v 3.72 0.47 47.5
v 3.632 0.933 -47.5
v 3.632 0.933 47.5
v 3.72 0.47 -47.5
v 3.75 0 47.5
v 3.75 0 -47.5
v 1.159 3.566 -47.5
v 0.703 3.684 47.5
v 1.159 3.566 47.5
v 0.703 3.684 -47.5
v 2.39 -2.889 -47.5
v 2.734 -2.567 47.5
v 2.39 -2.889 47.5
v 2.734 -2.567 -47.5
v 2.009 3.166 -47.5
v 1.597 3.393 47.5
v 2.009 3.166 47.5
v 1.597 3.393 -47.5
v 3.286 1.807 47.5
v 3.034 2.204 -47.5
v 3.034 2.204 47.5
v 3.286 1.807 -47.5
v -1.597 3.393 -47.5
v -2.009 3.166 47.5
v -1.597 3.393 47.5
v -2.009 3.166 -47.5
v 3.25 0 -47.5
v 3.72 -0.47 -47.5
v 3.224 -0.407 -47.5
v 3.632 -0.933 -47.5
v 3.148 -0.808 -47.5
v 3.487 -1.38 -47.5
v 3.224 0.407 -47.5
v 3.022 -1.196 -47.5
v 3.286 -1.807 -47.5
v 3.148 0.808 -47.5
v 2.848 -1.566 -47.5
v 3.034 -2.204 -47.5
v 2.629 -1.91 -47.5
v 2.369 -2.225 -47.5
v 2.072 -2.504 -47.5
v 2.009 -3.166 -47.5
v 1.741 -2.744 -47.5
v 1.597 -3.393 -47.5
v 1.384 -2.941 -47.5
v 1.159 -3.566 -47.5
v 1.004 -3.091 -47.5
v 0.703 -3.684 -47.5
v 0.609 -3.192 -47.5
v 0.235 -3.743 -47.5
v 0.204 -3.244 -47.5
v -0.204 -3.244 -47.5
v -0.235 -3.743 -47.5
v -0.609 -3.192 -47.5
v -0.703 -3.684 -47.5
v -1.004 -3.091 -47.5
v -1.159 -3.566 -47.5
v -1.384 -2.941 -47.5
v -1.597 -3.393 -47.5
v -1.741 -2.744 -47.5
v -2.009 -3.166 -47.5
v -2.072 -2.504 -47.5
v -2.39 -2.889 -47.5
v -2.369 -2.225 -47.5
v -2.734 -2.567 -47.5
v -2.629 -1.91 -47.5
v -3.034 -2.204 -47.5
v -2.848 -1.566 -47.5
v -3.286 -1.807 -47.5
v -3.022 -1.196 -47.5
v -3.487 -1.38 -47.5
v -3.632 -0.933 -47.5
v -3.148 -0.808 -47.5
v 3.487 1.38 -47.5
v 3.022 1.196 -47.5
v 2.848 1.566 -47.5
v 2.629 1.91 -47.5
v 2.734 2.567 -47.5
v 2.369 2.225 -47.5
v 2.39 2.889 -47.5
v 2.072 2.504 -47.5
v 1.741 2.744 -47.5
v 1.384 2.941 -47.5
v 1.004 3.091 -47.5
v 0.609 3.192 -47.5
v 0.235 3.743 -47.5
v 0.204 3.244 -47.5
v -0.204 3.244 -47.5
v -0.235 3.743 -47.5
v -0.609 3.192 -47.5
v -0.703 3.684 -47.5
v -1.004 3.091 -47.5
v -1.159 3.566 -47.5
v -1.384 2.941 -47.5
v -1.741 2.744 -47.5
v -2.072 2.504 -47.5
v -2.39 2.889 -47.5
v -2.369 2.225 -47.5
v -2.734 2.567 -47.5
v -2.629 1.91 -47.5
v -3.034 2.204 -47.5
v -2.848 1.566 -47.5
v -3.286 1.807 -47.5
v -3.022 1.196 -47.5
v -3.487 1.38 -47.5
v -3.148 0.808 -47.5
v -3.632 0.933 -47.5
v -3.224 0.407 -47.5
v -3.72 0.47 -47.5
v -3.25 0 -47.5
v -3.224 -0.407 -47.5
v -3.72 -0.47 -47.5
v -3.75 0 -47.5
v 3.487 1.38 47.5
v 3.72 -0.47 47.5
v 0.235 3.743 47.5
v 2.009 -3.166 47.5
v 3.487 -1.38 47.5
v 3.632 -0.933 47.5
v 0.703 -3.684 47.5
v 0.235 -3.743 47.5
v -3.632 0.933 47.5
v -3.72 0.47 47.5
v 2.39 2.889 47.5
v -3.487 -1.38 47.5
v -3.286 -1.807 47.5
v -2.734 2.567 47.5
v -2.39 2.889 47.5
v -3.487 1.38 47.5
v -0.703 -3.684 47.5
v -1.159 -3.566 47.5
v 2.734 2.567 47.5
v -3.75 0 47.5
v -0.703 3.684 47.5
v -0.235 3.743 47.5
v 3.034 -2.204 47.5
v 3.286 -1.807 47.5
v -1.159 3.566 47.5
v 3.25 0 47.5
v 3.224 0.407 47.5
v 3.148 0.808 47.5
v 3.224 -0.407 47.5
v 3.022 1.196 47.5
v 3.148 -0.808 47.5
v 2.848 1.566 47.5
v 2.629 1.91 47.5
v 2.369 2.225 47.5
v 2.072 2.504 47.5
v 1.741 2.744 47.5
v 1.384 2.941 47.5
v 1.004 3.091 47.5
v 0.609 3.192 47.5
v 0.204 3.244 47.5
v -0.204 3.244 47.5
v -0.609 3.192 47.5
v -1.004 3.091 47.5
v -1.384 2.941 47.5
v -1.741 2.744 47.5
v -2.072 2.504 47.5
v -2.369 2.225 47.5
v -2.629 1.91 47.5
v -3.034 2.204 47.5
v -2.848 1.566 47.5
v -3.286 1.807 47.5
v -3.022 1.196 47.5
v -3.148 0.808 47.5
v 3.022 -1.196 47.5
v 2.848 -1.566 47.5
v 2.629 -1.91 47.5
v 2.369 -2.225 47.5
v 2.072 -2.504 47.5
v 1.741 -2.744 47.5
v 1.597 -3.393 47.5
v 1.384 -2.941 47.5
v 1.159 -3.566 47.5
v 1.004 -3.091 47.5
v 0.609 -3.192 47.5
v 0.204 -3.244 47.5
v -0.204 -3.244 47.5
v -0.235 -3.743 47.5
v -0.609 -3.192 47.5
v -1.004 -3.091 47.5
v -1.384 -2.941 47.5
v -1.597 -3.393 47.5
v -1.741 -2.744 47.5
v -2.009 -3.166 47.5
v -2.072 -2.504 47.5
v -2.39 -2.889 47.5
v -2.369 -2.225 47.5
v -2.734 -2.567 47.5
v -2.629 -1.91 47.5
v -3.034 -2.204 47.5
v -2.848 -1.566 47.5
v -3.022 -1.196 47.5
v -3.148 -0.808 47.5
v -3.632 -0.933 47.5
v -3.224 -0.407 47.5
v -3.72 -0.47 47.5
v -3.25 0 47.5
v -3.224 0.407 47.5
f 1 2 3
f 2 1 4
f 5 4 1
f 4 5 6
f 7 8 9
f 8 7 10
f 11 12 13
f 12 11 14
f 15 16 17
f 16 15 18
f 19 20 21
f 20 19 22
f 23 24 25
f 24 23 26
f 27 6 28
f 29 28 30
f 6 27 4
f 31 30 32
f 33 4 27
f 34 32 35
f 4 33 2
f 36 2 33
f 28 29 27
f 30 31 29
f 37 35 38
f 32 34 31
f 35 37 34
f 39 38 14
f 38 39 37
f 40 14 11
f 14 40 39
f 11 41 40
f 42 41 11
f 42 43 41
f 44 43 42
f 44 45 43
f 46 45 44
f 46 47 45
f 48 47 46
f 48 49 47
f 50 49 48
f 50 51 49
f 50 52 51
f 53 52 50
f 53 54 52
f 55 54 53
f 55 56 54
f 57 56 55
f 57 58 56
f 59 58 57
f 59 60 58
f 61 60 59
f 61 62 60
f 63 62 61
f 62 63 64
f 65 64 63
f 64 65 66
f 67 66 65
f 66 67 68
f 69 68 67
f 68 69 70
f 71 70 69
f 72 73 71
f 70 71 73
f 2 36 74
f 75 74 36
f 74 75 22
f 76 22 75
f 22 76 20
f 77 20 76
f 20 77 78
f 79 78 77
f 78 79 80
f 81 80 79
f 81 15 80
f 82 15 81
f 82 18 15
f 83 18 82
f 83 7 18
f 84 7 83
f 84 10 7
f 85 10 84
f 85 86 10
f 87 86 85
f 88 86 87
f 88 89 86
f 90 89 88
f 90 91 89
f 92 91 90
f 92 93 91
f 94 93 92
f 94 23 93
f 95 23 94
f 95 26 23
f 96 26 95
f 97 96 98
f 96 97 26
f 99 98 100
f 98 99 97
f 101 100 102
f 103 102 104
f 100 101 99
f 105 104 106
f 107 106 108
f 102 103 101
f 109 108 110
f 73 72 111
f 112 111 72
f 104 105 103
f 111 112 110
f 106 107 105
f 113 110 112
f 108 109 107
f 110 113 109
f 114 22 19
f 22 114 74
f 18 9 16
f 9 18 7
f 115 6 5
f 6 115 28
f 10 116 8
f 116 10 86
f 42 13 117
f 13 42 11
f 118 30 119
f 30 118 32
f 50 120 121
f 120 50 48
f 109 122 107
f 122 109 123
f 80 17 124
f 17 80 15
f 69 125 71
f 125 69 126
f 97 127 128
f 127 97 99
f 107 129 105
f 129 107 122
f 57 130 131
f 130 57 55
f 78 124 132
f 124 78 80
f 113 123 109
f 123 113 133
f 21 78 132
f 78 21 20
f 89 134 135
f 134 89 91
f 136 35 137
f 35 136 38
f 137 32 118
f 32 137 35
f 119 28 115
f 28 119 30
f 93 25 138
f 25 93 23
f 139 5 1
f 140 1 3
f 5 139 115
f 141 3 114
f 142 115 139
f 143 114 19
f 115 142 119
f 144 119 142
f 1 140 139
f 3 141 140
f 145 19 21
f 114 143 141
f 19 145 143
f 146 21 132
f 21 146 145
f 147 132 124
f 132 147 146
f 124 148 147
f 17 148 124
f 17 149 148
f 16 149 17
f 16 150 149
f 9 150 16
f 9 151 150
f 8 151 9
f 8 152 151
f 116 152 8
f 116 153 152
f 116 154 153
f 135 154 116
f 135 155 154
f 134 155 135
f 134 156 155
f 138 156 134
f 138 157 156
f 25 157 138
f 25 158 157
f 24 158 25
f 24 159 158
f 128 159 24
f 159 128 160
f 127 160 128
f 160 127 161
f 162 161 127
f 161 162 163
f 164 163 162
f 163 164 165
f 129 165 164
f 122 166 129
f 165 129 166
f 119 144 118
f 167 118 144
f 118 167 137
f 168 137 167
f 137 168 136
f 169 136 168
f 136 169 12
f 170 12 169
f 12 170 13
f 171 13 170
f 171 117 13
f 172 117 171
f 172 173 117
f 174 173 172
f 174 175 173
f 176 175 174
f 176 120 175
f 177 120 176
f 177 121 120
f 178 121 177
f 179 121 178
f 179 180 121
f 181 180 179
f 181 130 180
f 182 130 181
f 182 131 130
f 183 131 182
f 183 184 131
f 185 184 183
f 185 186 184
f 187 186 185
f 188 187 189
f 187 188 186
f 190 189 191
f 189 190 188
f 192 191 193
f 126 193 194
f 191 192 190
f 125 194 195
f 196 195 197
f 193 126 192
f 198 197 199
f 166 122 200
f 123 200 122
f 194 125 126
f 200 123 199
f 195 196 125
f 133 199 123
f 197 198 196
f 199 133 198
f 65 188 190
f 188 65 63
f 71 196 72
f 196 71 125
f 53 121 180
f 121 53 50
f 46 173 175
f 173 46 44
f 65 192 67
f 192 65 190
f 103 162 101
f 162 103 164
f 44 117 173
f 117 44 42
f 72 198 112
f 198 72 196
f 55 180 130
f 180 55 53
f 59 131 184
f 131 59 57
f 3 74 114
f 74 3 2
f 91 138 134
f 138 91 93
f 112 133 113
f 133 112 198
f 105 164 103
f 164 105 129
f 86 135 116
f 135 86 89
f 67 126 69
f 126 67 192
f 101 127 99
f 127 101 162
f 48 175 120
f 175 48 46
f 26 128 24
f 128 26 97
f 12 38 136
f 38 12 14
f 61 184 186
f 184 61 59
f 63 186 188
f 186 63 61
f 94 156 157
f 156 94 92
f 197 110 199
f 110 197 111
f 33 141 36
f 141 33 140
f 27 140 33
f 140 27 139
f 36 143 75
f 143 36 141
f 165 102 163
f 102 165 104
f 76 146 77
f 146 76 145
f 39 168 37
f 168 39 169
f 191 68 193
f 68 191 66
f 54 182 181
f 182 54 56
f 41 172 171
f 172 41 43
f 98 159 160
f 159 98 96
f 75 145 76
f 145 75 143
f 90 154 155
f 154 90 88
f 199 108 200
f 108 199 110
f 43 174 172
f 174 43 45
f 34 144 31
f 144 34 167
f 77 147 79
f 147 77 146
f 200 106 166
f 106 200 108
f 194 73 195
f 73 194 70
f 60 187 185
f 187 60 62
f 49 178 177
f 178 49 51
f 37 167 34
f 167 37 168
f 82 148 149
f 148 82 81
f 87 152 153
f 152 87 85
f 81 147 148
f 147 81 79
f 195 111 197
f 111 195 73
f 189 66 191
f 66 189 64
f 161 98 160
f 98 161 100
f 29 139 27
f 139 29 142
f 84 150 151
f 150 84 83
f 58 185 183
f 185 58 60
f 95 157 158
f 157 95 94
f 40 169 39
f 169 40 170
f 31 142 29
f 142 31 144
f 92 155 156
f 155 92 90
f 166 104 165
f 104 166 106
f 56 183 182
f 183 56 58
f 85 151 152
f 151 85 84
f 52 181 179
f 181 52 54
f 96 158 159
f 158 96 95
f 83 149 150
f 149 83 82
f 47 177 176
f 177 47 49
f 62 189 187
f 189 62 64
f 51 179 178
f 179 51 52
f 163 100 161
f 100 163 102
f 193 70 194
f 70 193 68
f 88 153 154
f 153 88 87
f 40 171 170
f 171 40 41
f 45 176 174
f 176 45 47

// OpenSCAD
$fn = 50;


difference() {
	union() {
		translate(v = [0, 0, -47.5000000000]) {
			cylinder(h = 95, r = 3.7500000000);
		}
	}
	union() {
		translate(v = [0, 0, -100.0000000000]) {
			cylinder(h = 200, r = 3.2500000000);
		}
	}
}
